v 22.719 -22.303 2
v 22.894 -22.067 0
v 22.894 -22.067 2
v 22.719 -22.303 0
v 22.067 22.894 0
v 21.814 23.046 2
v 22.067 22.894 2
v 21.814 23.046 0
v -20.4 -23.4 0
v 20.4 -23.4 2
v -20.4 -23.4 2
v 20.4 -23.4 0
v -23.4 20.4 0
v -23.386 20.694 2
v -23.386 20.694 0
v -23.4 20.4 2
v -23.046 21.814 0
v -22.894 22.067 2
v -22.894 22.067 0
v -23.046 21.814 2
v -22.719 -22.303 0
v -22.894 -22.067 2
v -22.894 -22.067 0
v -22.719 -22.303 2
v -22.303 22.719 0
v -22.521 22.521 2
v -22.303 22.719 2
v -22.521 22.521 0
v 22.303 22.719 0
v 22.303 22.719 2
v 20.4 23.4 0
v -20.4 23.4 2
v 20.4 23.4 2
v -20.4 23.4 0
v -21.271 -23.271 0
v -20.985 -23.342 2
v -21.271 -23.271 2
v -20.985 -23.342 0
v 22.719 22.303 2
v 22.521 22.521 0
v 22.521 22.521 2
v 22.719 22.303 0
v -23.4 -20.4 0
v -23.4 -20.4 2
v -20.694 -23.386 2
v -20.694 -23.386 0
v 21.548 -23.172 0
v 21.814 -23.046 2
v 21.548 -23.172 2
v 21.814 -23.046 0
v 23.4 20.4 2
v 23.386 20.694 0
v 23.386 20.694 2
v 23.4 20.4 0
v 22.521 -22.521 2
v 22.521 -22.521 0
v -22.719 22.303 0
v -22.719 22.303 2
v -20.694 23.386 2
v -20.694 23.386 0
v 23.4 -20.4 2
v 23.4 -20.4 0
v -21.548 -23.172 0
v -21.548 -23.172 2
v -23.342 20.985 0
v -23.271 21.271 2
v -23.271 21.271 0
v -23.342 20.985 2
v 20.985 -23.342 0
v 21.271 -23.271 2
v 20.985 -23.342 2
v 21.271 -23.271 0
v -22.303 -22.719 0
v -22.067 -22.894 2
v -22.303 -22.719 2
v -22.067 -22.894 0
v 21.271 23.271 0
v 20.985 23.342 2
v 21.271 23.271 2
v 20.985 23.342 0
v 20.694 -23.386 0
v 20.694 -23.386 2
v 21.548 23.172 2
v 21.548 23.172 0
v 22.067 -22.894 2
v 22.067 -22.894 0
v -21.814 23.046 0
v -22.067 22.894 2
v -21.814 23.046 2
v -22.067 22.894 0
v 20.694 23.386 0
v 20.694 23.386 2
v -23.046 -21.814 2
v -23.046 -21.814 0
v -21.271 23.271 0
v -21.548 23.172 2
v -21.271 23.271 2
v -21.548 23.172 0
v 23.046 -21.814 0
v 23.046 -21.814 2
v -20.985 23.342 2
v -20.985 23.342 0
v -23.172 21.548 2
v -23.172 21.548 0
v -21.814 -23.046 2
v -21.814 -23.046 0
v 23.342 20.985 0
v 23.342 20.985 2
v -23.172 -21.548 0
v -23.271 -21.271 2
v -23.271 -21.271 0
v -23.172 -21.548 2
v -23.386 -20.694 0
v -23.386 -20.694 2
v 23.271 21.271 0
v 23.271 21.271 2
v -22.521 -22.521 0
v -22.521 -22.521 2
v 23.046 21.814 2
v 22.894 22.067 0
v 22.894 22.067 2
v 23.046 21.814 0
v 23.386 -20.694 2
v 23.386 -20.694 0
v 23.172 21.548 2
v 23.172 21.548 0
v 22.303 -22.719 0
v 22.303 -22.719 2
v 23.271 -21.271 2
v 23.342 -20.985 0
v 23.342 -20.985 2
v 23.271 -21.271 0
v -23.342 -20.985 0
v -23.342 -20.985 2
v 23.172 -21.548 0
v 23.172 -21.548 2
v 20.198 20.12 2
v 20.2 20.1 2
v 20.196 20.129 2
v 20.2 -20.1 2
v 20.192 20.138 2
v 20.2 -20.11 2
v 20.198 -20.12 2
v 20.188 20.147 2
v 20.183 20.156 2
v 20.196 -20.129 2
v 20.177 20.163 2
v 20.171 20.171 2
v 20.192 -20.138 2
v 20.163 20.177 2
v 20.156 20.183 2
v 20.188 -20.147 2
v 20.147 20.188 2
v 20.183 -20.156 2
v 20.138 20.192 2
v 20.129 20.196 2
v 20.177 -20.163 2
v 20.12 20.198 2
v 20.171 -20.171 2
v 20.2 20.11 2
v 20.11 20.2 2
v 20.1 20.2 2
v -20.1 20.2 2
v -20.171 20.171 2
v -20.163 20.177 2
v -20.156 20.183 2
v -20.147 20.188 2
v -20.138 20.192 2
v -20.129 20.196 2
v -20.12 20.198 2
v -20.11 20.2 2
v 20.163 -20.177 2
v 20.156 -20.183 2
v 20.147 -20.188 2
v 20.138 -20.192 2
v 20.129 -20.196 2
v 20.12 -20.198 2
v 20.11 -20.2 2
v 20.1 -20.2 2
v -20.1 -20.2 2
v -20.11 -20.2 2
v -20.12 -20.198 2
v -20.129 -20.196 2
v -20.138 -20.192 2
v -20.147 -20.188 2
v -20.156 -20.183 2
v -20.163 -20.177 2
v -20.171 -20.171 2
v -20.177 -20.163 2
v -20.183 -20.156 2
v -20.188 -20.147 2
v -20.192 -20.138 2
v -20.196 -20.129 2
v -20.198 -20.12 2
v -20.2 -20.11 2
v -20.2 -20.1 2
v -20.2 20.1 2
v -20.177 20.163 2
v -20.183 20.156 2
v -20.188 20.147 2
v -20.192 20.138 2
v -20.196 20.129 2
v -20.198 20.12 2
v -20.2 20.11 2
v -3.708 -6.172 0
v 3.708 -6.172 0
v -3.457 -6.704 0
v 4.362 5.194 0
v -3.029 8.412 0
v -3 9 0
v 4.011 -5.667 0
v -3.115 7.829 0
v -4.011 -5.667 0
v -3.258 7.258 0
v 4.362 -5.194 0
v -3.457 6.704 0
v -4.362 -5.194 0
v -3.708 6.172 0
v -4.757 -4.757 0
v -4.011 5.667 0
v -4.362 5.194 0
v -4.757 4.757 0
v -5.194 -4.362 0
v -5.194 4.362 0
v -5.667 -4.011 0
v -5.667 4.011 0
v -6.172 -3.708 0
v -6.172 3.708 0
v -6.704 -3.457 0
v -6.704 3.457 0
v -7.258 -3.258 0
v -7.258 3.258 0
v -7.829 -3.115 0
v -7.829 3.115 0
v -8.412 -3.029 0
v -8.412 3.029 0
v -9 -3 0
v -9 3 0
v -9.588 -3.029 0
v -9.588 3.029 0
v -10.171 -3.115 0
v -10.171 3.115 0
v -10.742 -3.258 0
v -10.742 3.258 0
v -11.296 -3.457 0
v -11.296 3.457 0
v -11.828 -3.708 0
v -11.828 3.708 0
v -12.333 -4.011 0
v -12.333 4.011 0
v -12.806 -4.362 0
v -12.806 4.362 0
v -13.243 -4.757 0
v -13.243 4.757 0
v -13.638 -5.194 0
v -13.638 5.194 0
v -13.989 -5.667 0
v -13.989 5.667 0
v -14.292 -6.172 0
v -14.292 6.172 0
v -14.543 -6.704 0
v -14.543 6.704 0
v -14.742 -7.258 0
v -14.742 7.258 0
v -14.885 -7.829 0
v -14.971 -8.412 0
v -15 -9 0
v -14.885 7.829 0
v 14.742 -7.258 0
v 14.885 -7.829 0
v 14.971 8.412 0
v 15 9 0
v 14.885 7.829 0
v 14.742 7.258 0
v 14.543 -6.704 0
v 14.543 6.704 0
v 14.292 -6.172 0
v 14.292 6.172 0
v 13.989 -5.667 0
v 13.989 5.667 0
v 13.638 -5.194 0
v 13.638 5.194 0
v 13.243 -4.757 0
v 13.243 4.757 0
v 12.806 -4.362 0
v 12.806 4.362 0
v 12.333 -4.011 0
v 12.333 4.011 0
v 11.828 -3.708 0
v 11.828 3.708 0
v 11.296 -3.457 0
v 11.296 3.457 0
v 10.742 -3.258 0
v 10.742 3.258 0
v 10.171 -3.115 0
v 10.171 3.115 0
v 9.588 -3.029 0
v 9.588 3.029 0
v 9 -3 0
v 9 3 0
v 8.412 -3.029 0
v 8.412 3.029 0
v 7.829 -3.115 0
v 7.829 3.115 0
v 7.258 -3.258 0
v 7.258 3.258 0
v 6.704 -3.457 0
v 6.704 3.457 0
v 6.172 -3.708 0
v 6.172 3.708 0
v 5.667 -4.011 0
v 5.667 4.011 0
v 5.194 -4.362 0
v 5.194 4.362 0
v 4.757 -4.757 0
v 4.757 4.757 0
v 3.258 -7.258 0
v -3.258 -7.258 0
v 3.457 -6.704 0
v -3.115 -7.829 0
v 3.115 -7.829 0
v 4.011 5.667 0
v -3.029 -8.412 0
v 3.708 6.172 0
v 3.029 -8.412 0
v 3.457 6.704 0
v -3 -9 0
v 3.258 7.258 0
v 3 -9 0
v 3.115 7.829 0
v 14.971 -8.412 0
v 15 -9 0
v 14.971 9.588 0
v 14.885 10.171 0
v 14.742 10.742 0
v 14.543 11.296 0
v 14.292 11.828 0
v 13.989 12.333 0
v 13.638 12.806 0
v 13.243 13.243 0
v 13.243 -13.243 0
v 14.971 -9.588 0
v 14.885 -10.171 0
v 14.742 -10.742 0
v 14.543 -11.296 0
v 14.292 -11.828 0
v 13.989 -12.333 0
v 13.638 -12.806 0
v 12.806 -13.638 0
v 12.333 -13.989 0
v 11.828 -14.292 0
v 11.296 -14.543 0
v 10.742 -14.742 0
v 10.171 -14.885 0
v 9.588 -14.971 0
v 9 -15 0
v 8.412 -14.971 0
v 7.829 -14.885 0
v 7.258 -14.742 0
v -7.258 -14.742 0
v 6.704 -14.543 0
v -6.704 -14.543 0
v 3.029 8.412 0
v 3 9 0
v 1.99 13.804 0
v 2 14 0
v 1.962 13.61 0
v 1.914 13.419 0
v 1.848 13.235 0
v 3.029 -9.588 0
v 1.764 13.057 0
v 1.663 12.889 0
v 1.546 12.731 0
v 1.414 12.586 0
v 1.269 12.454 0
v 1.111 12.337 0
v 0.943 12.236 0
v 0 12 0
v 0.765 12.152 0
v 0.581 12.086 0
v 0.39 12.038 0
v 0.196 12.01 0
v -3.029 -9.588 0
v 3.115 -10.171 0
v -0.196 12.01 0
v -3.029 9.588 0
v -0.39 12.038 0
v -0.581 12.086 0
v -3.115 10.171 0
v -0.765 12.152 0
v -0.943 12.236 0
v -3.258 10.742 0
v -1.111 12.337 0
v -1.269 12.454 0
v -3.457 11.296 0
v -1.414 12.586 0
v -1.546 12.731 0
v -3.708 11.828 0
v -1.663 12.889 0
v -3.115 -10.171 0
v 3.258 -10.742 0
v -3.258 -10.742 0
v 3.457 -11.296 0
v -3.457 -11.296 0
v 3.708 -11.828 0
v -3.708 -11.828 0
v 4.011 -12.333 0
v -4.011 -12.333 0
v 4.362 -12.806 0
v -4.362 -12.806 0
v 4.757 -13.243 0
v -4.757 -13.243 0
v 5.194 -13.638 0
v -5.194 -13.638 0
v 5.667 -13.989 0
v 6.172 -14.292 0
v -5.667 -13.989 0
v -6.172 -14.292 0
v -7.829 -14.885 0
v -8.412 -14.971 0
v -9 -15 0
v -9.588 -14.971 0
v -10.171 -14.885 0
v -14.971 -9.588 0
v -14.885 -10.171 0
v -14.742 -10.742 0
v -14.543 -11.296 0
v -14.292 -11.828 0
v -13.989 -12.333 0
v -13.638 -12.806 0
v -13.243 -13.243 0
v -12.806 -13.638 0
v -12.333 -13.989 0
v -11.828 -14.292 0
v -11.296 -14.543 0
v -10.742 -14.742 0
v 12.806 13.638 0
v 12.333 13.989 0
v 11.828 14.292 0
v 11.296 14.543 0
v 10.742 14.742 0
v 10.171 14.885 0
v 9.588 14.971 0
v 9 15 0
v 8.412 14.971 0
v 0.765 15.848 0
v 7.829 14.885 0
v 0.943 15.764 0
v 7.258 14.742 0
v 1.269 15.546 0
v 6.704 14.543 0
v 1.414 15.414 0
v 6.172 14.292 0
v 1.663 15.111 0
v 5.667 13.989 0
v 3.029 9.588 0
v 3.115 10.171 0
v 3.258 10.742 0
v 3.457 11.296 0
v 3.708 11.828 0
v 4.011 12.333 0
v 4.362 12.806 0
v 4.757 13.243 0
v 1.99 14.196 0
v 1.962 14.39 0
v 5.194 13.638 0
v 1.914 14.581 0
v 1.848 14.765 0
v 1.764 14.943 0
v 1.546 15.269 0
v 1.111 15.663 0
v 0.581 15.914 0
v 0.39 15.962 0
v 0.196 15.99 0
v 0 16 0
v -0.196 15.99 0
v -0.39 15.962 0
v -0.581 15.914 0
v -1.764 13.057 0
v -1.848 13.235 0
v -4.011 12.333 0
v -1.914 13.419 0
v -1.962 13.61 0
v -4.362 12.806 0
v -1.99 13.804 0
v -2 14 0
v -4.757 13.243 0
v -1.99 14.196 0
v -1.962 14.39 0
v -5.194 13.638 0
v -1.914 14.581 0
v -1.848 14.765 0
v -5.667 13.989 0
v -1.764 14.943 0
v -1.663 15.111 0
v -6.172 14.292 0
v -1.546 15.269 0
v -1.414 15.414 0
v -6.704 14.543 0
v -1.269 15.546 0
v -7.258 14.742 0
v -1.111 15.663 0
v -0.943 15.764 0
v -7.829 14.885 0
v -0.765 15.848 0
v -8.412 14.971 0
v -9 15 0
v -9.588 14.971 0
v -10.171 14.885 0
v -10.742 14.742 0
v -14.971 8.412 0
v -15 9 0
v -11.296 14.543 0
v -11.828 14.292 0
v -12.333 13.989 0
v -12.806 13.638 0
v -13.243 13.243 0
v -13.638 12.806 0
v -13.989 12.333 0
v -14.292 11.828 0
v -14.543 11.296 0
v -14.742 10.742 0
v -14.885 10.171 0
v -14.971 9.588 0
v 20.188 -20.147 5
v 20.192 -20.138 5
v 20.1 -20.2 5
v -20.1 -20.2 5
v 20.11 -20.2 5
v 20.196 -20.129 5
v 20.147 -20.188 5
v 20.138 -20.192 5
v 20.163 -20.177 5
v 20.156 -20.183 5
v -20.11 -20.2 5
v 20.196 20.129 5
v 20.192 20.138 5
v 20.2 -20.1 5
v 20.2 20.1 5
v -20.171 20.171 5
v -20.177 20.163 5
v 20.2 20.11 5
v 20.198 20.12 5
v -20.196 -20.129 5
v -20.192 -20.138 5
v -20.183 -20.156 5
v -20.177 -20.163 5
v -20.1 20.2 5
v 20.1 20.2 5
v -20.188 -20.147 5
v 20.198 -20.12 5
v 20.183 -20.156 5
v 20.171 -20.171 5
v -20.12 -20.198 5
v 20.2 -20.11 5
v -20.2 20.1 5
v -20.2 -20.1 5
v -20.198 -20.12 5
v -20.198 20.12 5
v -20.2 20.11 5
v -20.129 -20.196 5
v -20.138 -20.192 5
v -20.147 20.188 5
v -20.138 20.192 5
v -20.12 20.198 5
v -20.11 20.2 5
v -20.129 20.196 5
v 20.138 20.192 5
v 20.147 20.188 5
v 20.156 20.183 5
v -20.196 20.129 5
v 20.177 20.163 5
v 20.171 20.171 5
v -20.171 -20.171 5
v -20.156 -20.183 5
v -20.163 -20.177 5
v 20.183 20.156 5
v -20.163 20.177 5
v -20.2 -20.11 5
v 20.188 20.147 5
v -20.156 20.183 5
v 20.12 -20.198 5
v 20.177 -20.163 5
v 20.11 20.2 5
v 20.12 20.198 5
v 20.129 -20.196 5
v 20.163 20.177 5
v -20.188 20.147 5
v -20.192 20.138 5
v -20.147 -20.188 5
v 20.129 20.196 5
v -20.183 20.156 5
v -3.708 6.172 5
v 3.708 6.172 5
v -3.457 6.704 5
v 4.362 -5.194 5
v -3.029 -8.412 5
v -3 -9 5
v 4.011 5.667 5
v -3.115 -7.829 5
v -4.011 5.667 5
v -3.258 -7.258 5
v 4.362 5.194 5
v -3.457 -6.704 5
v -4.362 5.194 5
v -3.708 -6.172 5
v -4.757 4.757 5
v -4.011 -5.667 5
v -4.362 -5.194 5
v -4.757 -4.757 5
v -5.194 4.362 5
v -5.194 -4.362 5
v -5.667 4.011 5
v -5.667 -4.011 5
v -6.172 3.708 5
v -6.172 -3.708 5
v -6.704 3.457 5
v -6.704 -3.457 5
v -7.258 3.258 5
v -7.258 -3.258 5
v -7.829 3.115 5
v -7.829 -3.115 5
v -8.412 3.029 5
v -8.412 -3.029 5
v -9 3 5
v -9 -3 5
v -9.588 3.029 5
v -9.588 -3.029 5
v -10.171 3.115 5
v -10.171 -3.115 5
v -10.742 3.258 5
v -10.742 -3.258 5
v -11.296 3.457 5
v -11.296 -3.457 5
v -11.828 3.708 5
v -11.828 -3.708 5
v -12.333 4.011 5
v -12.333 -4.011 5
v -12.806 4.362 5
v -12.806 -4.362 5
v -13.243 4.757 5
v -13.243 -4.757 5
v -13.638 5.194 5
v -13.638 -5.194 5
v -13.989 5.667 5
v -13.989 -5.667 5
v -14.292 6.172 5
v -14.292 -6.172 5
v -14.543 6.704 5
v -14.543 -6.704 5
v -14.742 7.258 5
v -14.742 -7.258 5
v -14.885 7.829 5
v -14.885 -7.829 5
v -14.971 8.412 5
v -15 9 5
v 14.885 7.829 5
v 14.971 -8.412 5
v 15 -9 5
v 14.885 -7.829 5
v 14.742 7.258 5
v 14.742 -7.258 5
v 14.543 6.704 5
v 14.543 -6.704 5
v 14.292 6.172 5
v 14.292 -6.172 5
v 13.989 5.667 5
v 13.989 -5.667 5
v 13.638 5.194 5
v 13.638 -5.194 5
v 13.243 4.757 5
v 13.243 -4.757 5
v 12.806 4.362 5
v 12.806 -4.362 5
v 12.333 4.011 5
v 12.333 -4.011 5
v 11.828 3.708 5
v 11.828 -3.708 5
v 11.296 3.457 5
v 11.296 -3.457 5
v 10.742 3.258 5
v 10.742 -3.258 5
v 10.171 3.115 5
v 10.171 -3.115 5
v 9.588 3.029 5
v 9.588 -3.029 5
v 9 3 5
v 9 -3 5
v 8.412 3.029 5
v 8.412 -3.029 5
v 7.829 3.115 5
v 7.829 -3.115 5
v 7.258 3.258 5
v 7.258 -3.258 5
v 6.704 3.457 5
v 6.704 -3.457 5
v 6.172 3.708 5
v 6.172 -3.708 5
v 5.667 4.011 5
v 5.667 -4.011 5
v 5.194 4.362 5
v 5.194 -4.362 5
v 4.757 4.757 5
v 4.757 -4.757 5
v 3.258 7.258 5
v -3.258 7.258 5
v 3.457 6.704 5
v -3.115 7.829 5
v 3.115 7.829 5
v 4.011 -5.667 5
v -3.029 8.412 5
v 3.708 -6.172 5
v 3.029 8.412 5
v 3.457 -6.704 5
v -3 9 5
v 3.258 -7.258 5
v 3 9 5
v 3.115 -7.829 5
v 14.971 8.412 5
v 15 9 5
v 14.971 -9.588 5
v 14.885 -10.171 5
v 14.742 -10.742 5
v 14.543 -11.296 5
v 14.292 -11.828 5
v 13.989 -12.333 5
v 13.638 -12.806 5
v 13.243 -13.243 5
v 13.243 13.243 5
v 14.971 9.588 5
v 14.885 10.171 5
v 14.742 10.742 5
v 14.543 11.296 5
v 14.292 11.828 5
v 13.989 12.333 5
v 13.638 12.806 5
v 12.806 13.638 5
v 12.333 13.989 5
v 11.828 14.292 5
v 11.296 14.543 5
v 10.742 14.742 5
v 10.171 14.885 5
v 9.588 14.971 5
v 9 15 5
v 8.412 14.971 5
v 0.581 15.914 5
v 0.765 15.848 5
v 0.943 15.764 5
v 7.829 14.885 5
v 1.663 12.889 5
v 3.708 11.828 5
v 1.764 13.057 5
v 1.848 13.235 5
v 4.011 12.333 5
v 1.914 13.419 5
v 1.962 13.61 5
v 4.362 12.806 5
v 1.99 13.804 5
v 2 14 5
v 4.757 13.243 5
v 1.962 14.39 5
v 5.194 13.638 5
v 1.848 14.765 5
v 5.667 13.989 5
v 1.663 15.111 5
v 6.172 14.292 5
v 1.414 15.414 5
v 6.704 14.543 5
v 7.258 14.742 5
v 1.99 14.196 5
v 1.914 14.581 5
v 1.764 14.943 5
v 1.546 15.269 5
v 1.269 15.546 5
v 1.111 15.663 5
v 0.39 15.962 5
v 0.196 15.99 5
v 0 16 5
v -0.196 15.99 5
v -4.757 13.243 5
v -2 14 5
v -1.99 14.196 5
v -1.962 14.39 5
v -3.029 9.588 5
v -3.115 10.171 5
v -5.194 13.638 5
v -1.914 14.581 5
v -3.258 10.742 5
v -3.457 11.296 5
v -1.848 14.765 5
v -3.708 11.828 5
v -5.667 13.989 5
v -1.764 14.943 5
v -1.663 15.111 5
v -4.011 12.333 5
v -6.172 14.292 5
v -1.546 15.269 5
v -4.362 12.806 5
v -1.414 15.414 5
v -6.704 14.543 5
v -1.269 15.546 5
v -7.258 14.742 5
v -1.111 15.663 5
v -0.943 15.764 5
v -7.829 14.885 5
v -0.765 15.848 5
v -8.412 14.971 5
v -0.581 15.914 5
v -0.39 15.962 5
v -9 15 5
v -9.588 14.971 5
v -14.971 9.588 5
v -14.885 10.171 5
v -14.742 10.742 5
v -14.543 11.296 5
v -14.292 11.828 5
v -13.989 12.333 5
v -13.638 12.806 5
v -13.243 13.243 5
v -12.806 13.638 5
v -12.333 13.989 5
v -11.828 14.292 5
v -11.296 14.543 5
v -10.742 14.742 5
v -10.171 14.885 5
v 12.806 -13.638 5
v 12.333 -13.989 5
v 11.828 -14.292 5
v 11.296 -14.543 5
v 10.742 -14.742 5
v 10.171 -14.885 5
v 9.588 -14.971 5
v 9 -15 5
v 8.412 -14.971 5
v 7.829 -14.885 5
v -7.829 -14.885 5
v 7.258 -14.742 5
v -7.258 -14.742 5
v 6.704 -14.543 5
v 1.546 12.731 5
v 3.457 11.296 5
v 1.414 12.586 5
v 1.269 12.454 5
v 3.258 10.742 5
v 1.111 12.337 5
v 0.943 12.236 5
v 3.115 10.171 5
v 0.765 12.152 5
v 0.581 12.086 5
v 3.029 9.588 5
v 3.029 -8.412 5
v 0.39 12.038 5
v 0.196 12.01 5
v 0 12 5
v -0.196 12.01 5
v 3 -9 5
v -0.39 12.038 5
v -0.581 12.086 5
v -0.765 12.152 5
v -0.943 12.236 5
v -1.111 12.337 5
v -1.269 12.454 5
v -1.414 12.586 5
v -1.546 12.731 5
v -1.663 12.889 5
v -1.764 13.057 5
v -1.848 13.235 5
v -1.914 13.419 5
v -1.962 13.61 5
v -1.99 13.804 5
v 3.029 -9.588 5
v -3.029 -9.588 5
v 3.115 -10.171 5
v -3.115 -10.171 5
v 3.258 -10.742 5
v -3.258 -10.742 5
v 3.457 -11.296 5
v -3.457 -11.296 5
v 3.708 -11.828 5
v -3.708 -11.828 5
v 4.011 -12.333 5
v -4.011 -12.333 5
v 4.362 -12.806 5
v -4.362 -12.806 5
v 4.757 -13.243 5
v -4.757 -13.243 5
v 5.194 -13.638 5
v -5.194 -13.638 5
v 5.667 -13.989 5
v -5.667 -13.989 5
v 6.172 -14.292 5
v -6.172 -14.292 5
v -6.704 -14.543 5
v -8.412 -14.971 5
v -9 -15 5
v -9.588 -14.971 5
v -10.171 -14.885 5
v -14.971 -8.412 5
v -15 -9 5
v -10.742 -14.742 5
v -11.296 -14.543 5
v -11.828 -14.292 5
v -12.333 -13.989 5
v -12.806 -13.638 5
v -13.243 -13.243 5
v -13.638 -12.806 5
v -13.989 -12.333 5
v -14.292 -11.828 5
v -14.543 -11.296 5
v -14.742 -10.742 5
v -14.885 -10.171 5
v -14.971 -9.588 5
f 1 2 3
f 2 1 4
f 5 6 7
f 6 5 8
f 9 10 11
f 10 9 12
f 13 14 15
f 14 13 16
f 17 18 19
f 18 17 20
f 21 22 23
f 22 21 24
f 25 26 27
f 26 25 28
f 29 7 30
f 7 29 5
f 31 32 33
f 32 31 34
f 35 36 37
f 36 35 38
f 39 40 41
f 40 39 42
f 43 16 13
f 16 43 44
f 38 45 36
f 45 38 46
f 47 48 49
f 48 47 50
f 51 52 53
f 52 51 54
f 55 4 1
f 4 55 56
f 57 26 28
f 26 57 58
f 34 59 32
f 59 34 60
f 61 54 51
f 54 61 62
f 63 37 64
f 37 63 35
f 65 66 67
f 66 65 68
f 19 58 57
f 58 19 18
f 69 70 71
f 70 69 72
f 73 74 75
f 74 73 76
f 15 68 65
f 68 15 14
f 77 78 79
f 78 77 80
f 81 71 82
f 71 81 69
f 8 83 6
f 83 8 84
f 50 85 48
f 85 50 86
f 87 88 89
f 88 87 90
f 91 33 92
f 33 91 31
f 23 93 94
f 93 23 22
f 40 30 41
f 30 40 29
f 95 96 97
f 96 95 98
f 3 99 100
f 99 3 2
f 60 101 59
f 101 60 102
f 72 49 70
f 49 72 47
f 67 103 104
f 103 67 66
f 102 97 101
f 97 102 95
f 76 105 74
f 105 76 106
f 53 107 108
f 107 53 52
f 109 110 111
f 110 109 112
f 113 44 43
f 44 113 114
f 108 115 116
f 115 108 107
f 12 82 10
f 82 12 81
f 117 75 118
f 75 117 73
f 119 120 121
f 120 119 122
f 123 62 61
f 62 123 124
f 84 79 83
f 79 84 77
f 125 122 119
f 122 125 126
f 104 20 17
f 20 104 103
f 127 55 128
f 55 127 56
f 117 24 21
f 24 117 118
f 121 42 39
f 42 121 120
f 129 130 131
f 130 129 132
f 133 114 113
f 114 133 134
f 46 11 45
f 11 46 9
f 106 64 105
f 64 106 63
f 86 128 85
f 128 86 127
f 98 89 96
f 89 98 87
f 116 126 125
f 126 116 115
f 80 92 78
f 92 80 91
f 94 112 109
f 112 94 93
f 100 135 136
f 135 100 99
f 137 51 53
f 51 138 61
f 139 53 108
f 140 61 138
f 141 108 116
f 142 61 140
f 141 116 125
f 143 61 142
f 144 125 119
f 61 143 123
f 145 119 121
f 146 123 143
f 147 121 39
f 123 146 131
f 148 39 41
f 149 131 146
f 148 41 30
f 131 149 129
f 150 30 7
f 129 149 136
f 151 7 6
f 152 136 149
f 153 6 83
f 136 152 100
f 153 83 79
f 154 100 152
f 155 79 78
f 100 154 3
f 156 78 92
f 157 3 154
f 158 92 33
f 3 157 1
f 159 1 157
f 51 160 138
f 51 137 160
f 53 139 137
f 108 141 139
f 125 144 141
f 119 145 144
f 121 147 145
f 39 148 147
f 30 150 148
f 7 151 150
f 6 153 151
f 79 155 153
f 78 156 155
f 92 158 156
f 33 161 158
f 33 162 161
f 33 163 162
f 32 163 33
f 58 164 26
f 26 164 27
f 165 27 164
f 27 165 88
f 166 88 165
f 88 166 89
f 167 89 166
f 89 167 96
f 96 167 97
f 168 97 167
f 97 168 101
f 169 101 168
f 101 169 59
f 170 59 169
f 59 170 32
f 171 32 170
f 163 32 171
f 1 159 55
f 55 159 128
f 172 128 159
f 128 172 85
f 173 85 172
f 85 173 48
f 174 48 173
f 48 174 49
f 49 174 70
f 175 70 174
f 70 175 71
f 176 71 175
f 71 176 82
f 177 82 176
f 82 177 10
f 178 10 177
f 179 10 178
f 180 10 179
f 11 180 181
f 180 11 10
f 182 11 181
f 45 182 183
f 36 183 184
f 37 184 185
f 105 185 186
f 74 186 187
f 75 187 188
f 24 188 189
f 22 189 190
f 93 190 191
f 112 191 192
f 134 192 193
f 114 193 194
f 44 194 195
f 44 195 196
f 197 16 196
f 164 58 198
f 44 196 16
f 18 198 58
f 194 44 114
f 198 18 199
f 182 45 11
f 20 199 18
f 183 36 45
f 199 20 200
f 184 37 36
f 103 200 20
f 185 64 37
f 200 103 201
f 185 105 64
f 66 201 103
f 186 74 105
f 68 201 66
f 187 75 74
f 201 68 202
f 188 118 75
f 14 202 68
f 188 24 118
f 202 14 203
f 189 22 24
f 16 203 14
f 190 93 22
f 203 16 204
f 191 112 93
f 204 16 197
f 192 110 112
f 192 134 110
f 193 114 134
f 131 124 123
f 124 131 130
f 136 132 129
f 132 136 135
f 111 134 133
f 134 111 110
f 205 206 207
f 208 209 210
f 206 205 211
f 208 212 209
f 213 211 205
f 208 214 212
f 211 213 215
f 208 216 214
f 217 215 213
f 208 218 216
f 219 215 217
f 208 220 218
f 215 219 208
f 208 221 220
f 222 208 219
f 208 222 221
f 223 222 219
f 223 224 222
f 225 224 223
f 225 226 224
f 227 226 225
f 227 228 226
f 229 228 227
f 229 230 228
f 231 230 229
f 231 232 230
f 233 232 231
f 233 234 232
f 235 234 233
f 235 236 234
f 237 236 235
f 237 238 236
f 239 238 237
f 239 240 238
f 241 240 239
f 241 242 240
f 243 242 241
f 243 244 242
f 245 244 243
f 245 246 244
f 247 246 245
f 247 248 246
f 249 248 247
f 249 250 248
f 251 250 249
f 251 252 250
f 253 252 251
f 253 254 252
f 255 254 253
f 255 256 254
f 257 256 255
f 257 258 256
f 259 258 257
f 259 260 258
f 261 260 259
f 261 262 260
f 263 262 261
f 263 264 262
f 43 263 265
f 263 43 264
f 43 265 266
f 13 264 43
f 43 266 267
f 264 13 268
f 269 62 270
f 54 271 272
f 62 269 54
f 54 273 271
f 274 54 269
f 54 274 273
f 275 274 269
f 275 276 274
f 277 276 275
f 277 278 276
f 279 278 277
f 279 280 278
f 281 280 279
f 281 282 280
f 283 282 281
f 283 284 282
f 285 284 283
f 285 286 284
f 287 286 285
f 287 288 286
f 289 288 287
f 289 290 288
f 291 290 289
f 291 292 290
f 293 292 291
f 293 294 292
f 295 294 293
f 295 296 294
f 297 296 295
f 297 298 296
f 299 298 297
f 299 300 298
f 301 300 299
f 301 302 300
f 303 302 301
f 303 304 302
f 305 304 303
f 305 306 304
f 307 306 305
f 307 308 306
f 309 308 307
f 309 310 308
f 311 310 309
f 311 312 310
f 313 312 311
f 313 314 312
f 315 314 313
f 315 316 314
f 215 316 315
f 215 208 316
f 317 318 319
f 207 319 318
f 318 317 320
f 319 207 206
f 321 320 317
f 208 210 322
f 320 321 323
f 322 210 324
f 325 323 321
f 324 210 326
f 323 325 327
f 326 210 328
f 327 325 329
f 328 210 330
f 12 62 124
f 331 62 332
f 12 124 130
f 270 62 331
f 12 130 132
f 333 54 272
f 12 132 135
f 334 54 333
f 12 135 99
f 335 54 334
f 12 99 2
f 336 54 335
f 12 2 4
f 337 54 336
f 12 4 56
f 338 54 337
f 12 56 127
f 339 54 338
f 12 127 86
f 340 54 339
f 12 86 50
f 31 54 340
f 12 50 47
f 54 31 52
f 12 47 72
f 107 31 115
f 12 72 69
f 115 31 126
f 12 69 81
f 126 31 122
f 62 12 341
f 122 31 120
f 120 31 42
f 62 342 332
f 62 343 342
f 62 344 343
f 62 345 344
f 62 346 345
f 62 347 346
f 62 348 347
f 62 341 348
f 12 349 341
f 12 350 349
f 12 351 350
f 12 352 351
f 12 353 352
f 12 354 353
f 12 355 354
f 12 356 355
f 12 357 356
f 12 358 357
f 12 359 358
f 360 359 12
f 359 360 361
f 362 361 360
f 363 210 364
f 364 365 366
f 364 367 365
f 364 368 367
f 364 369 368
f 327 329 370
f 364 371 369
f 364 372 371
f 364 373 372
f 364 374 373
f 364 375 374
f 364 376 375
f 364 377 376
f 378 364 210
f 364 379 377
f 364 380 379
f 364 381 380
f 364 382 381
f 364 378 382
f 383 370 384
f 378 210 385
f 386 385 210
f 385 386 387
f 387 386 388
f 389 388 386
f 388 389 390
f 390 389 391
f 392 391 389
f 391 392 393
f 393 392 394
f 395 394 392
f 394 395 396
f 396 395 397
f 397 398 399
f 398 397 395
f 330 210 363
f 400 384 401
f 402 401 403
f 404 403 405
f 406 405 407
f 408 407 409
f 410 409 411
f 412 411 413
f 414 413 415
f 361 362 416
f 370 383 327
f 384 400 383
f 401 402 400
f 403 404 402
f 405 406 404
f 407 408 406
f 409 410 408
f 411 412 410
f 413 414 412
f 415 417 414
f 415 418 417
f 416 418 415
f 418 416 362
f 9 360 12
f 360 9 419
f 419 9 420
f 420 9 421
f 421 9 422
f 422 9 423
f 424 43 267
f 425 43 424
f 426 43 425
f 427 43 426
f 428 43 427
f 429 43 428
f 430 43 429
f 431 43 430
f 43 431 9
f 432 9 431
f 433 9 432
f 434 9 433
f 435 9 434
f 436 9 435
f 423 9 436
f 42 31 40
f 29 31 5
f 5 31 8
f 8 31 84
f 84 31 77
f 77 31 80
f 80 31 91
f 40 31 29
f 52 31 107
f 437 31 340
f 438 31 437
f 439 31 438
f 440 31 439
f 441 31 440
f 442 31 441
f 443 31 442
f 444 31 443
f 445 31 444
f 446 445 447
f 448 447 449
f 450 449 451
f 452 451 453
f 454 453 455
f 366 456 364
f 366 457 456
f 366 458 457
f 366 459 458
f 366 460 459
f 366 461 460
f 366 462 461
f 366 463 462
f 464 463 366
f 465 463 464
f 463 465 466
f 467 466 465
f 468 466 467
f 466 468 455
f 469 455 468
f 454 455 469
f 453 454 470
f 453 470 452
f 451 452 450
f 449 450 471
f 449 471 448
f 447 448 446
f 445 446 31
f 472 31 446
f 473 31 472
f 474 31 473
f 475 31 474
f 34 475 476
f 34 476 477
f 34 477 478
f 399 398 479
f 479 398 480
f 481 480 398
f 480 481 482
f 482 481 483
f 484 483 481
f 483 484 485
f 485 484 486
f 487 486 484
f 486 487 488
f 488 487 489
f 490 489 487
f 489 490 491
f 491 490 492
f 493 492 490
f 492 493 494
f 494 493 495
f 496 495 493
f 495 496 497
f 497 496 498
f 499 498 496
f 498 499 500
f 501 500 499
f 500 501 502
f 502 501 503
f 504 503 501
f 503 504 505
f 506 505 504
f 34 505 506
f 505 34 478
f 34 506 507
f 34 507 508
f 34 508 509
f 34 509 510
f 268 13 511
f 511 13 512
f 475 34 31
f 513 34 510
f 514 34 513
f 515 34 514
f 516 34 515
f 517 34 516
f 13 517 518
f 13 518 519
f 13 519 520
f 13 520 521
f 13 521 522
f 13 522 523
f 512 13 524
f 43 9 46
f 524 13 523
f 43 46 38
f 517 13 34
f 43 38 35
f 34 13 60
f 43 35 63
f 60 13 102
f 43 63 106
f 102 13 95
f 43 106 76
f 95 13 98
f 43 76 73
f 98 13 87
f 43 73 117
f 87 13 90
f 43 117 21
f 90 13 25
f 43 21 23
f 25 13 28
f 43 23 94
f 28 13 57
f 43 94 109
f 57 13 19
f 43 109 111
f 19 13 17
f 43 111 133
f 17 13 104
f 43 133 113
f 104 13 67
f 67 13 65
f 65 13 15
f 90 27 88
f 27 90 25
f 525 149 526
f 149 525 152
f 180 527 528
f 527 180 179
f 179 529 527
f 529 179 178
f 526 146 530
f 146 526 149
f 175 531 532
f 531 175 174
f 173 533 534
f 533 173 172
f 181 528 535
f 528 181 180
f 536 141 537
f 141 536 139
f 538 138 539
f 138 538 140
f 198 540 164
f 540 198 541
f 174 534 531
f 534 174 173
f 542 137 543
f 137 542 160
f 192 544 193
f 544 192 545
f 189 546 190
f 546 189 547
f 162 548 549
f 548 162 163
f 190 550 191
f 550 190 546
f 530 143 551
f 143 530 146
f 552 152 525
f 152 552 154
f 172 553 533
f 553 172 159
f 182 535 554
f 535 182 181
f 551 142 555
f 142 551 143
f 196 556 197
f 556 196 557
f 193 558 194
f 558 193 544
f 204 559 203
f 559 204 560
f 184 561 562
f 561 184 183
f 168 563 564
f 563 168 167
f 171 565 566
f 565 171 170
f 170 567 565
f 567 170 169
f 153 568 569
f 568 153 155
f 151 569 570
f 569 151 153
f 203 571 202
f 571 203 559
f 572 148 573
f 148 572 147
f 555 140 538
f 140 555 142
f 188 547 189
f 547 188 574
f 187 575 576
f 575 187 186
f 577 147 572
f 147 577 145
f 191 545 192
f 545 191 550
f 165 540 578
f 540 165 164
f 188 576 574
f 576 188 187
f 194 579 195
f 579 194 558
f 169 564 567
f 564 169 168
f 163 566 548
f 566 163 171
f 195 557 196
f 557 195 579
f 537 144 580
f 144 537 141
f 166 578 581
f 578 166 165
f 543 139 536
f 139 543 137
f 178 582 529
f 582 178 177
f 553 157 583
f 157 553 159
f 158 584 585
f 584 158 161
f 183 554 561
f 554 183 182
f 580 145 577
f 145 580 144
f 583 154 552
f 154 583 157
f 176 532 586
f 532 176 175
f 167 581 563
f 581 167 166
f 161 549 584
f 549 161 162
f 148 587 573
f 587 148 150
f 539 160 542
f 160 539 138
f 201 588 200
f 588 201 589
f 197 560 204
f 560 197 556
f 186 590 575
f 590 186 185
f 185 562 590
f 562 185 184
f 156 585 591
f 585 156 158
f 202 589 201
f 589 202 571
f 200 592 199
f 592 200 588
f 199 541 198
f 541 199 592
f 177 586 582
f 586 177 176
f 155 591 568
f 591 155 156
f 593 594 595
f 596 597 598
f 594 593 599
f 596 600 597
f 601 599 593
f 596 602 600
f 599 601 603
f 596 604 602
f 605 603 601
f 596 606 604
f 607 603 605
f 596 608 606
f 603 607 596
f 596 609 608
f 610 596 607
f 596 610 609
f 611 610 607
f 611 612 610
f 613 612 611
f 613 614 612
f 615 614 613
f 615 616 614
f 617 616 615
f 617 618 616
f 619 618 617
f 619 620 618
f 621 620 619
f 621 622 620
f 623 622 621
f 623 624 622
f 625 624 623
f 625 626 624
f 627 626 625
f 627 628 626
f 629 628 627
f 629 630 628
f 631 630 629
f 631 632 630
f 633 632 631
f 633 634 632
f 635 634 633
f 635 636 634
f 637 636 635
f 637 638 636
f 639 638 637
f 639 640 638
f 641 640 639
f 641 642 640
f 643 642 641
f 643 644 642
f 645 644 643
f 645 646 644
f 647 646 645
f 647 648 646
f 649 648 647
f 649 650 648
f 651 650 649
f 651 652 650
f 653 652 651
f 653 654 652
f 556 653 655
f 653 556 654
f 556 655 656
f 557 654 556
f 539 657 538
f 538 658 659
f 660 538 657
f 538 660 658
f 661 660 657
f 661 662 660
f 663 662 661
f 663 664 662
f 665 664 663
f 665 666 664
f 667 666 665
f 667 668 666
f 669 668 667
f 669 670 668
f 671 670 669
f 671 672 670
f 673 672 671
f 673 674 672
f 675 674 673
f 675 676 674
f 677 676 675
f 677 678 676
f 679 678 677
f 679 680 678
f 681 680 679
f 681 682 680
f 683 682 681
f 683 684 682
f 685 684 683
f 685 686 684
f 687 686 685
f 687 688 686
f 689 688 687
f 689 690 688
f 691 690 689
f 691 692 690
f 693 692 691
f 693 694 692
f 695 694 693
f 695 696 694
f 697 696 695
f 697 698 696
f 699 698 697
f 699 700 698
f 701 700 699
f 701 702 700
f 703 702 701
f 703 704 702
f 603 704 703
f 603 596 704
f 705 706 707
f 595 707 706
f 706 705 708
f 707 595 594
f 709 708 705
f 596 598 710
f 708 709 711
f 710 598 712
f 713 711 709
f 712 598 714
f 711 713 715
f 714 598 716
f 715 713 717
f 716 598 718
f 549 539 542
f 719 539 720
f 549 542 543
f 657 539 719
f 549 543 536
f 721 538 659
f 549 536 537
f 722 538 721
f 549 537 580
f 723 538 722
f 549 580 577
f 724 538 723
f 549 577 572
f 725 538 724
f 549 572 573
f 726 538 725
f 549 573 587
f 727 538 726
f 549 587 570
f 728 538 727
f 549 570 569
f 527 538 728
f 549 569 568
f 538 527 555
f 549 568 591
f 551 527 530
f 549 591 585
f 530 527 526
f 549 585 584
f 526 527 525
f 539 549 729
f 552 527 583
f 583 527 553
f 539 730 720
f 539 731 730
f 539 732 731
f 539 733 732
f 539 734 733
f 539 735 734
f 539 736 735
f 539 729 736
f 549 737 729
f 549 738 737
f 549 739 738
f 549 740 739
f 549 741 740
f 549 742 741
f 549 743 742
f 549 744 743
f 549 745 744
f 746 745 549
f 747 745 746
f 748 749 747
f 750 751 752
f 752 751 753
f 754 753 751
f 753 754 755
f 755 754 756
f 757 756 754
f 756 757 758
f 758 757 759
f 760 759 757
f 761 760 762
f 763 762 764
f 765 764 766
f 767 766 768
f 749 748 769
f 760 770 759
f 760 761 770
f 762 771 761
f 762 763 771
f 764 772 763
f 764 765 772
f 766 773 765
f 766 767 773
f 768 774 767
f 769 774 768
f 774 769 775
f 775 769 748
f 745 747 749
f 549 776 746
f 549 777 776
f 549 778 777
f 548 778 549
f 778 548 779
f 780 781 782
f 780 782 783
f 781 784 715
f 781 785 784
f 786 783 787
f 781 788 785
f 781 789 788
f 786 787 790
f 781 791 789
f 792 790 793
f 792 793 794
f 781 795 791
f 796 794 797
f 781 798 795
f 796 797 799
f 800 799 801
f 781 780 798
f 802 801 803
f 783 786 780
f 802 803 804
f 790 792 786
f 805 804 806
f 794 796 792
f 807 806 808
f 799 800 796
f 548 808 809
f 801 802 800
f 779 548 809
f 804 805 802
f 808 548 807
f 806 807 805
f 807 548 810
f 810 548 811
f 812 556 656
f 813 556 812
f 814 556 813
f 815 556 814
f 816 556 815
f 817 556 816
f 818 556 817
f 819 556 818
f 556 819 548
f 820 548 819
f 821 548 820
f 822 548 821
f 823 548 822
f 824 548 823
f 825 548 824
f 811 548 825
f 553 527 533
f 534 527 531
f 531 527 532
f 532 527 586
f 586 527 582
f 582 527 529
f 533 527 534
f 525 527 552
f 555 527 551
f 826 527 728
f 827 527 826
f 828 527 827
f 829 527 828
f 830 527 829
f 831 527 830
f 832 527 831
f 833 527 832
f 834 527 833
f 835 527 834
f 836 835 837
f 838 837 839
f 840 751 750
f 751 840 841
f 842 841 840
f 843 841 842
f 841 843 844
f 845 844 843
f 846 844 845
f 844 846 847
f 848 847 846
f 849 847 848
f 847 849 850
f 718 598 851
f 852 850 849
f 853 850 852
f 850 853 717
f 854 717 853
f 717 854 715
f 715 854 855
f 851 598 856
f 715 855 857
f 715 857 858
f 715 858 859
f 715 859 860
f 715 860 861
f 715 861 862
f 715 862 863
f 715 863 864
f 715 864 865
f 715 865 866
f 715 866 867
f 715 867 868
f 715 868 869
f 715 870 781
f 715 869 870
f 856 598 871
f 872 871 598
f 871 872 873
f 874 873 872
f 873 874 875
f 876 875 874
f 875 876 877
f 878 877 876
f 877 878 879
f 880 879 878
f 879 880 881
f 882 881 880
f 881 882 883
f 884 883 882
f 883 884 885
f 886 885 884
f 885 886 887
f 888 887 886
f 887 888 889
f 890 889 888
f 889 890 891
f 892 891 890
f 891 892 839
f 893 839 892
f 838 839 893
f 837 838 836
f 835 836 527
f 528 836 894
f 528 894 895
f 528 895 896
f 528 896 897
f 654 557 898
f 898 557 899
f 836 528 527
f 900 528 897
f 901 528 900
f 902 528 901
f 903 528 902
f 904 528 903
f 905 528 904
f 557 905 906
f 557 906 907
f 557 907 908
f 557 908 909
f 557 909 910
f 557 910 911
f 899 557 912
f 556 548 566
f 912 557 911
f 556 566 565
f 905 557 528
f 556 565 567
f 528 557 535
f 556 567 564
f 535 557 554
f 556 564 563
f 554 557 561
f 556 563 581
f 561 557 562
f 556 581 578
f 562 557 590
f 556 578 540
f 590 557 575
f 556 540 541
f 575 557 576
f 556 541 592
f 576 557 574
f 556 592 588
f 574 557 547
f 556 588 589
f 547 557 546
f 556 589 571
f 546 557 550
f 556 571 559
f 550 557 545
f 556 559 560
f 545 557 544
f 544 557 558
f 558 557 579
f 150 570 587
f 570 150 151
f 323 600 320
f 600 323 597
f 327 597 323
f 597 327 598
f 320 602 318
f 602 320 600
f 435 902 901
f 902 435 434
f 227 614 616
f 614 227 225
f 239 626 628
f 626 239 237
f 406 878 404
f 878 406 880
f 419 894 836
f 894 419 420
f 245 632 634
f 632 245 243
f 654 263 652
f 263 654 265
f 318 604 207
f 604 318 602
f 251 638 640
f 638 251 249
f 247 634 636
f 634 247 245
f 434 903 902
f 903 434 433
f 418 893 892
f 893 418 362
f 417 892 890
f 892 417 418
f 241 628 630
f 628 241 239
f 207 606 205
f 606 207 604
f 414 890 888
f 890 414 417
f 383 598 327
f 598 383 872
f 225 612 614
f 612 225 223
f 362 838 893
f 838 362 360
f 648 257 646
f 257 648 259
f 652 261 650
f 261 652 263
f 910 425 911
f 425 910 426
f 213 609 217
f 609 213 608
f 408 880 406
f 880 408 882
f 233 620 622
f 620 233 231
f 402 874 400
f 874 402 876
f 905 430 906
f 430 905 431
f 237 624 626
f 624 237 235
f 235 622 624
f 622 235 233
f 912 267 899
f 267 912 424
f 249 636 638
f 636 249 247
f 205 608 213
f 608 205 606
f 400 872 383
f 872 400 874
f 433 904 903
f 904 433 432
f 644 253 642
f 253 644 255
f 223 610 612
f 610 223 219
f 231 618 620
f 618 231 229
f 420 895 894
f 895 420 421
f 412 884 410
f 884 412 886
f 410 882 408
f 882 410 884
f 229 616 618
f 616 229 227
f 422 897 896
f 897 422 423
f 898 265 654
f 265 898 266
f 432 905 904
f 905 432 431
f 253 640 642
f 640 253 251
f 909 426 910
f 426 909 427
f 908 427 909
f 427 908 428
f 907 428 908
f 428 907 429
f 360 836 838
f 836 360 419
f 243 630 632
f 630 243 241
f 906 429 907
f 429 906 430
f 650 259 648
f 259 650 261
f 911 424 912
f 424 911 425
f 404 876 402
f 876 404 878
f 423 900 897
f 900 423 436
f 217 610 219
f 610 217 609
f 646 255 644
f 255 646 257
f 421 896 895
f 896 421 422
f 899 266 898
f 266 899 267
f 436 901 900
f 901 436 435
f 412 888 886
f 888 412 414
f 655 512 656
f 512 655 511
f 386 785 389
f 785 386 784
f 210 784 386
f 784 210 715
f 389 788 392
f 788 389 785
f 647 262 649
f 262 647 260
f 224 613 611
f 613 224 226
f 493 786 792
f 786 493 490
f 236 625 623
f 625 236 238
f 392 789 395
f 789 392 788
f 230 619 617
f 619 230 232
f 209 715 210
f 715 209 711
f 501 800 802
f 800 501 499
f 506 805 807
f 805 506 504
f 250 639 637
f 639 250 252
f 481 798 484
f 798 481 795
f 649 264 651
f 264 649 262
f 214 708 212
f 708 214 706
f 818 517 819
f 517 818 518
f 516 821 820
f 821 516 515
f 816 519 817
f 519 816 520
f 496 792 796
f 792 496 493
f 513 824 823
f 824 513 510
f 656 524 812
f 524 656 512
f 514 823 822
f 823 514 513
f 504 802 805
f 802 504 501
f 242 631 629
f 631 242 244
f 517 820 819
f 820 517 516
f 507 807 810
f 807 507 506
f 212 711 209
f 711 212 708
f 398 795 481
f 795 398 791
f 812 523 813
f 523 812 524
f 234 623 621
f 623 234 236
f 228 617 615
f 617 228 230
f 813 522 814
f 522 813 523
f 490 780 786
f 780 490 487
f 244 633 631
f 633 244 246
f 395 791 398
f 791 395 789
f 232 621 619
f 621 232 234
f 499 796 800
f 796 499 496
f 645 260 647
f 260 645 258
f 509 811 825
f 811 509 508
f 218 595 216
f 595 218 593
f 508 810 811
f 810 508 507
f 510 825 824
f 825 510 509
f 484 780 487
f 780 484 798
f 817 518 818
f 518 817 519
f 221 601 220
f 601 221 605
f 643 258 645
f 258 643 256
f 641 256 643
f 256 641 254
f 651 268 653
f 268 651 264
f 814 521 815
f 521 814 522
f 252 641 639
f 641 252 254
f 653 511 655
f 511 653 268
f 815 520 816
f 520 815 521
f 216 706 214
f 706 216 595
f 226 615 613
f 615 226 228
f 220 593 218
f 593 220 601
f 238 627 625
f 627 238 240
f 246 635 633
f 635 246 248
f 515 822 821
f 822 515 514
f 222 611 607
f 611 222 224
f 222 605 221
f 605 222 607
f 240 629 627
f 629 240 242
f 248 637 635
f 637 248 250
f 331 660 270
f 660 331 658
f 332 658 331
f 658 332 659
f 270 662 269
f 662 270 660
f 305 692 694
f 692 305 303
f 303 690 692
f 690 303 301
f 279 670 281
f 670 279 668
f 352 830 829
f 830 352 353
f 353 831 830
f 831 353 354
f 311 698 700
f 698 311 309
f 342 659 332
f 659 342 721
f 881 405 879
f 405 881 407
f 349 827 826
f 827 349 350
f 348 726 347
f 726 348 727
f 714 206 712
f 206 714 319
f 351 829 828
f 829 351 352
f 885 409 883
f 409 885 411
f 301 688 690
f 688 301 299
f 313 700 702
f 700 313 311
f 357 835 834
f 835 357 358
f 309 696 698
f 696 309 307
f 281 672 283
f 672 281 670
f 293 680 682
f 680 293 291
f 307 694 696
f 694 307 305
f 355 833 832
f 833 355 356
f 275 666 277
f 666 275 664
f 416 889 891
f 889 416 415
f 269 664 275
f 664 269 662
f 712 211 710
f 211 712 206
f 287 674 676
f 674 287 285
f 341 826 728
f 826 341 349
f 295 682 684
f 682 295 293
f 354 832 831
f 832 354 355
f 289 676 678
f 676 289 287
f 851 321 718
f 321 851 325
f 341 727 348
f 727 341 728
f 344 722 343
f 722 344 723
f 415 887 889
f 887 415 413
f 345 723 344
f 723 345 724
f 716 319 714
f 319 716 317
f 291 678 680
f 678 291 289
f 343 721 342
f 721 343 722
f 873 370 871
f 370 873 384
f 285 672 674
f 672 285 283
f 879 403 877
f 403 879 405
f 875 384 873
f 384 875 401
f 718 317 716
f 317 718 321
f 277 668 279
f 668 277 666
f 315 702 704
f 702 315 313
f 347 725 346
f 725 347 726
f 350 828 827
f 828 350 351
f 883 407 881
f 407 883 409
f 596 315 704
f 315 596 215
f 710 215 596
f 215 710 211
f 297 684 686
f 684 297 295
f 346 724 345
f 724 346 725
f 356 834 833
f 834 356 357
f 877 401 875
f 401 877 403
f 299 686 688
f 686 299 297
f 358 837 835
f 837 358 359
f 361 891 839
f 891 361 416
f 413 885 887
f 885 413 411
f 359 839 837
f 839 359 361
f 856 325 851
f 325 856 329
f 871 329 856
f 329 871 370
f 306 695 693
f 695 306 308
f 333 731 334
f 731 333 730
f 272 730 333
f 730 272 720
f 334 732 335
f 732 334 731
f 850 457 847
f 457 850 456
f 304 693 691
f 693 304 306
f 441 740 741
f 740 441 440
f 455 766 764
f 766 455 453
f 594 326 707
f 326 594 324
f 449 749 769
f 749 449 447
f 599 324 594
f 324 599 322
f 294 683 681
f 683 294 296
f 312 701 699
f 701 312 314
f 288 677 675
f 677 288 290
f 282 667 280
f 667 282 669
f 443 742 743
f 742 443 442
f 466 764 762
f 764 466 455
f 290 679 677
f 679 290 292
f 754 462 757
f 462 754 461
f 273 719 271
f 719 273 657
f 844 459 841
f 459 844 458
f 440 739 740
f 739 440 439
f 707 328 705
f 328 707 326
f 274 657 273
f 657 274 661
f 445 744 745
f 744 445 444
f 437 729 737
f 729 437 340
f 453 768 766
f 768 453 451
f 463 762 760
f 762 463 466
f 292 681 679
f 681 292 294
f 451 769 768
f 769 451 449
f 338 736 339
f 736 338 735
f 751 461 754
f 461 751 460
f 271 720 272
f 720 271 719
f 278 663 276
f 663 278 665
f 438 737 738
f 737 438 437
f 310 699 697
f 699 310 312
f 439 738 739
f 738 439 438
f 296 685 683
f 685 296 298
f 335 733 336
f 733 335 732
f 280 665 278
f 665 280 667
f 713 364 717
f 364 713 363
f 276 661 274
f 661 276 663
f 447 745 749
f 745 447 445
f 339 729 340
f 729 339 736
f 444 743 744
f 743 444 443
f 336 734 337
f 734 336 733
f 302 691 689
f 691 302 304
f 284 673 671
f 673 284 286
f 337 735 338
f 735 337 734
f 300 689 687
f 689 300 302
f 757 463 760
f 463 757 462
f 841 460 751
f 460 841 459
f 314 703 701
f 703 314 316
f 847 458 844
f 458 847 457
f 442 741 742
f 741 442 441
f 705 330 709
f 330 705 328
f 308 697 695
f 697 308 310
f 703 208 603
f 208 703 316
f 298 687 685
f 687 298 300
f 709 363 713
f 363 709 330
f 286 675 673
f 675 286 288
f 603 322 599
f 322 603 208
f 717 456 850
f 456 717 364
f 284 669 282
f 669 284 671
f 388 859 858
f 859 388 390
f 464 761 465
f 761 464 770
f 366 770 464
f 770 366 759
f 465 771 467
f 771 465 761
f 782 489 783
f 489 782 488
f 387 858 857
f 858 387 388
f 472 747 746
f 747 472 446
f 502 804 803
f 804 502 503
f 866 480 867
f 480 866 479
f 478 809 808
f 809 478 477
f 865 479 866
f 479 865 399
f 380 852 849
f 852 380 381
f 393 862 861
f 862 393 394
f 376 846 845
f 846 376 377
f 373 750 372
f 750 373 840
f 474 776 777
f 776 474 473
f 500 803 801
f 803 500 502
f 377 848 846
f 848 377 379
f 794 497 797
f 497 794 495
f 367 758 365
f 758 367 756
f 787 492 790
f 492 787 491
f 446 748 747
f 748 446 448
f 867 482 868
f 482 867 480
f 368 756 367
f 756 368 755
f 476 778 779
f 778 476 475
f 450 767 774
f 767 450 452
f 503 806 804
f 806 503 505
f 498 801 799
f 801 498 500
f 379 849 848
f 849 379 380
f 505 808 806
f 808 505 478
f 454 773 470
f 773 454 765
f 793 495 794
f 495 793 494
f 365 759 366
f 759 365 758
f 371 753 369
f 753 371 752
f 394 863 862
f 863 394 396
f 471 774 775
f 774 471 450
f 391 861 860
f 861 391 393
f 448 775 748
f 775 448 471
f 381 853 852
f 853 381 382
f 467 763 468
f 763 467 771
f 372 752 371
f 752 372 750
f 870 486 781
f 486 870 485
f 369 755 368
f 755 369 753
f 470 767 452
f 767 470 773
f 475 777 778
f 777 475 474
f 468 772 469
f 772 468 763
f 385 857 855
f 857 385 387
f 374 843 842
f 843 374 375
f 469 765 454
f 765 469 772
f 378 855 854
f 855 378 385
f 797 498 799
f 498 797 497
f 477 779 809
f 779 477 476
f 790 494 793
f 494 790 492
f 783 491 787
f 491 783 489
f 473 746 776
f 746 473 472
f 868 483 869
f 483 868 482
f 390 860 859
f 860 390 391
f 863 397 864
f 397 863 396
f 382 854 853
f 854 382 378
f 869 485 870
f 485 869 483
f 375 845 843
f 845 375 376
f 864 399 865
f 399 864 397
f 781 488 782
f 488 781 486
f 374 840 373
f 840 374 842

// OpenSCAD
// datum_cap -- the cover for a datum_core tray.
//
// Four contact openings on a 2 x 2 grid and one indicator light pipe, over a
// lip that drops into the core's cavity. Split from datum_core because the
// enclosure record asks for one core body and separate pieces around it, and
// because a `show` parameter selecting between two objects is two parts
// wearing one name -- its bounds depended on which mode you asked for.
//
// It renders from its own defaults and knows nothing about any particular PCB.

$fn = 64;

/* [Board] */
board_x = 40;
board_y = 40;
board_clearance = 0.4;

/* [Print settings] */
// House constants, print-validated on QM hardware -- parts/footpedal/button.scad.
walls = 3;
tolerence = .4;

/* [Plate] */
lid_t = 2.0;
corner_r = 3.0;
lip_h = 3.0;

/* [Indicator] */
indicator_d = 4.0;
indicator_x = 0;
indicator_y = 14;

/* [Contacts] */
contact_d = 12.0;
contact_pitch_x = 18.0;
contact_pitch_y = 18.0;

// ---------------------------------------------------------------- derived --

wall = walls;
lip_clearance = tolerence / 2;

cavity_x = board_x + 2 * board_clearance;
cavity_y = board_y + 2 * board_clearance;
outer_x = cavity_x + 2 * wall;
outer_y = cavity_y + 2 * wall;
lid_h = lid_t + lip_h;

_CORNERS = [[-1, -1], [-1, 1], [1, -1], [1, 1]];

// ----------------------------------------------------------------- shapes --

module rrect(x, y, h, r) {
    hull()
        for (sx = [-1, 1], sy = [-1, 1])
            translate([sx * (x / 2 - r), sy * (y / 2 - r), 0])
                cylinder(r = r, h = h);
}

module contact_positions() {
    for (sx = [-1, 1], sy = [-1, 1])
        translate([sx * contact_pitch_x / 2, sy * contact_pitch_y / 2, 0])
            children();
}

// ------------------------------------------------------------------ render --

// Modelled plate-down, which is how it prints.
difference() {
    union() {
        rrect(outer_x, outer_y, lid_t, corner_r);
        translate([0, 0, lid_t])
            rrect(cavity_x - 2 * lip_clearance,
                  cavity_y - 2 * lip_clearance,
                  lip_h,
                  max(0.1, corner_r - wall));
    }

    translate([0, 0, -0.1])
        contact_positions()
            cylinder(d = contact_d, h = lid_h + 0.2);

    translate([indicator_x, indicator_y, -0.1])
        cylinder(d = indicator_d, h = lid_h + 0.2);
}
